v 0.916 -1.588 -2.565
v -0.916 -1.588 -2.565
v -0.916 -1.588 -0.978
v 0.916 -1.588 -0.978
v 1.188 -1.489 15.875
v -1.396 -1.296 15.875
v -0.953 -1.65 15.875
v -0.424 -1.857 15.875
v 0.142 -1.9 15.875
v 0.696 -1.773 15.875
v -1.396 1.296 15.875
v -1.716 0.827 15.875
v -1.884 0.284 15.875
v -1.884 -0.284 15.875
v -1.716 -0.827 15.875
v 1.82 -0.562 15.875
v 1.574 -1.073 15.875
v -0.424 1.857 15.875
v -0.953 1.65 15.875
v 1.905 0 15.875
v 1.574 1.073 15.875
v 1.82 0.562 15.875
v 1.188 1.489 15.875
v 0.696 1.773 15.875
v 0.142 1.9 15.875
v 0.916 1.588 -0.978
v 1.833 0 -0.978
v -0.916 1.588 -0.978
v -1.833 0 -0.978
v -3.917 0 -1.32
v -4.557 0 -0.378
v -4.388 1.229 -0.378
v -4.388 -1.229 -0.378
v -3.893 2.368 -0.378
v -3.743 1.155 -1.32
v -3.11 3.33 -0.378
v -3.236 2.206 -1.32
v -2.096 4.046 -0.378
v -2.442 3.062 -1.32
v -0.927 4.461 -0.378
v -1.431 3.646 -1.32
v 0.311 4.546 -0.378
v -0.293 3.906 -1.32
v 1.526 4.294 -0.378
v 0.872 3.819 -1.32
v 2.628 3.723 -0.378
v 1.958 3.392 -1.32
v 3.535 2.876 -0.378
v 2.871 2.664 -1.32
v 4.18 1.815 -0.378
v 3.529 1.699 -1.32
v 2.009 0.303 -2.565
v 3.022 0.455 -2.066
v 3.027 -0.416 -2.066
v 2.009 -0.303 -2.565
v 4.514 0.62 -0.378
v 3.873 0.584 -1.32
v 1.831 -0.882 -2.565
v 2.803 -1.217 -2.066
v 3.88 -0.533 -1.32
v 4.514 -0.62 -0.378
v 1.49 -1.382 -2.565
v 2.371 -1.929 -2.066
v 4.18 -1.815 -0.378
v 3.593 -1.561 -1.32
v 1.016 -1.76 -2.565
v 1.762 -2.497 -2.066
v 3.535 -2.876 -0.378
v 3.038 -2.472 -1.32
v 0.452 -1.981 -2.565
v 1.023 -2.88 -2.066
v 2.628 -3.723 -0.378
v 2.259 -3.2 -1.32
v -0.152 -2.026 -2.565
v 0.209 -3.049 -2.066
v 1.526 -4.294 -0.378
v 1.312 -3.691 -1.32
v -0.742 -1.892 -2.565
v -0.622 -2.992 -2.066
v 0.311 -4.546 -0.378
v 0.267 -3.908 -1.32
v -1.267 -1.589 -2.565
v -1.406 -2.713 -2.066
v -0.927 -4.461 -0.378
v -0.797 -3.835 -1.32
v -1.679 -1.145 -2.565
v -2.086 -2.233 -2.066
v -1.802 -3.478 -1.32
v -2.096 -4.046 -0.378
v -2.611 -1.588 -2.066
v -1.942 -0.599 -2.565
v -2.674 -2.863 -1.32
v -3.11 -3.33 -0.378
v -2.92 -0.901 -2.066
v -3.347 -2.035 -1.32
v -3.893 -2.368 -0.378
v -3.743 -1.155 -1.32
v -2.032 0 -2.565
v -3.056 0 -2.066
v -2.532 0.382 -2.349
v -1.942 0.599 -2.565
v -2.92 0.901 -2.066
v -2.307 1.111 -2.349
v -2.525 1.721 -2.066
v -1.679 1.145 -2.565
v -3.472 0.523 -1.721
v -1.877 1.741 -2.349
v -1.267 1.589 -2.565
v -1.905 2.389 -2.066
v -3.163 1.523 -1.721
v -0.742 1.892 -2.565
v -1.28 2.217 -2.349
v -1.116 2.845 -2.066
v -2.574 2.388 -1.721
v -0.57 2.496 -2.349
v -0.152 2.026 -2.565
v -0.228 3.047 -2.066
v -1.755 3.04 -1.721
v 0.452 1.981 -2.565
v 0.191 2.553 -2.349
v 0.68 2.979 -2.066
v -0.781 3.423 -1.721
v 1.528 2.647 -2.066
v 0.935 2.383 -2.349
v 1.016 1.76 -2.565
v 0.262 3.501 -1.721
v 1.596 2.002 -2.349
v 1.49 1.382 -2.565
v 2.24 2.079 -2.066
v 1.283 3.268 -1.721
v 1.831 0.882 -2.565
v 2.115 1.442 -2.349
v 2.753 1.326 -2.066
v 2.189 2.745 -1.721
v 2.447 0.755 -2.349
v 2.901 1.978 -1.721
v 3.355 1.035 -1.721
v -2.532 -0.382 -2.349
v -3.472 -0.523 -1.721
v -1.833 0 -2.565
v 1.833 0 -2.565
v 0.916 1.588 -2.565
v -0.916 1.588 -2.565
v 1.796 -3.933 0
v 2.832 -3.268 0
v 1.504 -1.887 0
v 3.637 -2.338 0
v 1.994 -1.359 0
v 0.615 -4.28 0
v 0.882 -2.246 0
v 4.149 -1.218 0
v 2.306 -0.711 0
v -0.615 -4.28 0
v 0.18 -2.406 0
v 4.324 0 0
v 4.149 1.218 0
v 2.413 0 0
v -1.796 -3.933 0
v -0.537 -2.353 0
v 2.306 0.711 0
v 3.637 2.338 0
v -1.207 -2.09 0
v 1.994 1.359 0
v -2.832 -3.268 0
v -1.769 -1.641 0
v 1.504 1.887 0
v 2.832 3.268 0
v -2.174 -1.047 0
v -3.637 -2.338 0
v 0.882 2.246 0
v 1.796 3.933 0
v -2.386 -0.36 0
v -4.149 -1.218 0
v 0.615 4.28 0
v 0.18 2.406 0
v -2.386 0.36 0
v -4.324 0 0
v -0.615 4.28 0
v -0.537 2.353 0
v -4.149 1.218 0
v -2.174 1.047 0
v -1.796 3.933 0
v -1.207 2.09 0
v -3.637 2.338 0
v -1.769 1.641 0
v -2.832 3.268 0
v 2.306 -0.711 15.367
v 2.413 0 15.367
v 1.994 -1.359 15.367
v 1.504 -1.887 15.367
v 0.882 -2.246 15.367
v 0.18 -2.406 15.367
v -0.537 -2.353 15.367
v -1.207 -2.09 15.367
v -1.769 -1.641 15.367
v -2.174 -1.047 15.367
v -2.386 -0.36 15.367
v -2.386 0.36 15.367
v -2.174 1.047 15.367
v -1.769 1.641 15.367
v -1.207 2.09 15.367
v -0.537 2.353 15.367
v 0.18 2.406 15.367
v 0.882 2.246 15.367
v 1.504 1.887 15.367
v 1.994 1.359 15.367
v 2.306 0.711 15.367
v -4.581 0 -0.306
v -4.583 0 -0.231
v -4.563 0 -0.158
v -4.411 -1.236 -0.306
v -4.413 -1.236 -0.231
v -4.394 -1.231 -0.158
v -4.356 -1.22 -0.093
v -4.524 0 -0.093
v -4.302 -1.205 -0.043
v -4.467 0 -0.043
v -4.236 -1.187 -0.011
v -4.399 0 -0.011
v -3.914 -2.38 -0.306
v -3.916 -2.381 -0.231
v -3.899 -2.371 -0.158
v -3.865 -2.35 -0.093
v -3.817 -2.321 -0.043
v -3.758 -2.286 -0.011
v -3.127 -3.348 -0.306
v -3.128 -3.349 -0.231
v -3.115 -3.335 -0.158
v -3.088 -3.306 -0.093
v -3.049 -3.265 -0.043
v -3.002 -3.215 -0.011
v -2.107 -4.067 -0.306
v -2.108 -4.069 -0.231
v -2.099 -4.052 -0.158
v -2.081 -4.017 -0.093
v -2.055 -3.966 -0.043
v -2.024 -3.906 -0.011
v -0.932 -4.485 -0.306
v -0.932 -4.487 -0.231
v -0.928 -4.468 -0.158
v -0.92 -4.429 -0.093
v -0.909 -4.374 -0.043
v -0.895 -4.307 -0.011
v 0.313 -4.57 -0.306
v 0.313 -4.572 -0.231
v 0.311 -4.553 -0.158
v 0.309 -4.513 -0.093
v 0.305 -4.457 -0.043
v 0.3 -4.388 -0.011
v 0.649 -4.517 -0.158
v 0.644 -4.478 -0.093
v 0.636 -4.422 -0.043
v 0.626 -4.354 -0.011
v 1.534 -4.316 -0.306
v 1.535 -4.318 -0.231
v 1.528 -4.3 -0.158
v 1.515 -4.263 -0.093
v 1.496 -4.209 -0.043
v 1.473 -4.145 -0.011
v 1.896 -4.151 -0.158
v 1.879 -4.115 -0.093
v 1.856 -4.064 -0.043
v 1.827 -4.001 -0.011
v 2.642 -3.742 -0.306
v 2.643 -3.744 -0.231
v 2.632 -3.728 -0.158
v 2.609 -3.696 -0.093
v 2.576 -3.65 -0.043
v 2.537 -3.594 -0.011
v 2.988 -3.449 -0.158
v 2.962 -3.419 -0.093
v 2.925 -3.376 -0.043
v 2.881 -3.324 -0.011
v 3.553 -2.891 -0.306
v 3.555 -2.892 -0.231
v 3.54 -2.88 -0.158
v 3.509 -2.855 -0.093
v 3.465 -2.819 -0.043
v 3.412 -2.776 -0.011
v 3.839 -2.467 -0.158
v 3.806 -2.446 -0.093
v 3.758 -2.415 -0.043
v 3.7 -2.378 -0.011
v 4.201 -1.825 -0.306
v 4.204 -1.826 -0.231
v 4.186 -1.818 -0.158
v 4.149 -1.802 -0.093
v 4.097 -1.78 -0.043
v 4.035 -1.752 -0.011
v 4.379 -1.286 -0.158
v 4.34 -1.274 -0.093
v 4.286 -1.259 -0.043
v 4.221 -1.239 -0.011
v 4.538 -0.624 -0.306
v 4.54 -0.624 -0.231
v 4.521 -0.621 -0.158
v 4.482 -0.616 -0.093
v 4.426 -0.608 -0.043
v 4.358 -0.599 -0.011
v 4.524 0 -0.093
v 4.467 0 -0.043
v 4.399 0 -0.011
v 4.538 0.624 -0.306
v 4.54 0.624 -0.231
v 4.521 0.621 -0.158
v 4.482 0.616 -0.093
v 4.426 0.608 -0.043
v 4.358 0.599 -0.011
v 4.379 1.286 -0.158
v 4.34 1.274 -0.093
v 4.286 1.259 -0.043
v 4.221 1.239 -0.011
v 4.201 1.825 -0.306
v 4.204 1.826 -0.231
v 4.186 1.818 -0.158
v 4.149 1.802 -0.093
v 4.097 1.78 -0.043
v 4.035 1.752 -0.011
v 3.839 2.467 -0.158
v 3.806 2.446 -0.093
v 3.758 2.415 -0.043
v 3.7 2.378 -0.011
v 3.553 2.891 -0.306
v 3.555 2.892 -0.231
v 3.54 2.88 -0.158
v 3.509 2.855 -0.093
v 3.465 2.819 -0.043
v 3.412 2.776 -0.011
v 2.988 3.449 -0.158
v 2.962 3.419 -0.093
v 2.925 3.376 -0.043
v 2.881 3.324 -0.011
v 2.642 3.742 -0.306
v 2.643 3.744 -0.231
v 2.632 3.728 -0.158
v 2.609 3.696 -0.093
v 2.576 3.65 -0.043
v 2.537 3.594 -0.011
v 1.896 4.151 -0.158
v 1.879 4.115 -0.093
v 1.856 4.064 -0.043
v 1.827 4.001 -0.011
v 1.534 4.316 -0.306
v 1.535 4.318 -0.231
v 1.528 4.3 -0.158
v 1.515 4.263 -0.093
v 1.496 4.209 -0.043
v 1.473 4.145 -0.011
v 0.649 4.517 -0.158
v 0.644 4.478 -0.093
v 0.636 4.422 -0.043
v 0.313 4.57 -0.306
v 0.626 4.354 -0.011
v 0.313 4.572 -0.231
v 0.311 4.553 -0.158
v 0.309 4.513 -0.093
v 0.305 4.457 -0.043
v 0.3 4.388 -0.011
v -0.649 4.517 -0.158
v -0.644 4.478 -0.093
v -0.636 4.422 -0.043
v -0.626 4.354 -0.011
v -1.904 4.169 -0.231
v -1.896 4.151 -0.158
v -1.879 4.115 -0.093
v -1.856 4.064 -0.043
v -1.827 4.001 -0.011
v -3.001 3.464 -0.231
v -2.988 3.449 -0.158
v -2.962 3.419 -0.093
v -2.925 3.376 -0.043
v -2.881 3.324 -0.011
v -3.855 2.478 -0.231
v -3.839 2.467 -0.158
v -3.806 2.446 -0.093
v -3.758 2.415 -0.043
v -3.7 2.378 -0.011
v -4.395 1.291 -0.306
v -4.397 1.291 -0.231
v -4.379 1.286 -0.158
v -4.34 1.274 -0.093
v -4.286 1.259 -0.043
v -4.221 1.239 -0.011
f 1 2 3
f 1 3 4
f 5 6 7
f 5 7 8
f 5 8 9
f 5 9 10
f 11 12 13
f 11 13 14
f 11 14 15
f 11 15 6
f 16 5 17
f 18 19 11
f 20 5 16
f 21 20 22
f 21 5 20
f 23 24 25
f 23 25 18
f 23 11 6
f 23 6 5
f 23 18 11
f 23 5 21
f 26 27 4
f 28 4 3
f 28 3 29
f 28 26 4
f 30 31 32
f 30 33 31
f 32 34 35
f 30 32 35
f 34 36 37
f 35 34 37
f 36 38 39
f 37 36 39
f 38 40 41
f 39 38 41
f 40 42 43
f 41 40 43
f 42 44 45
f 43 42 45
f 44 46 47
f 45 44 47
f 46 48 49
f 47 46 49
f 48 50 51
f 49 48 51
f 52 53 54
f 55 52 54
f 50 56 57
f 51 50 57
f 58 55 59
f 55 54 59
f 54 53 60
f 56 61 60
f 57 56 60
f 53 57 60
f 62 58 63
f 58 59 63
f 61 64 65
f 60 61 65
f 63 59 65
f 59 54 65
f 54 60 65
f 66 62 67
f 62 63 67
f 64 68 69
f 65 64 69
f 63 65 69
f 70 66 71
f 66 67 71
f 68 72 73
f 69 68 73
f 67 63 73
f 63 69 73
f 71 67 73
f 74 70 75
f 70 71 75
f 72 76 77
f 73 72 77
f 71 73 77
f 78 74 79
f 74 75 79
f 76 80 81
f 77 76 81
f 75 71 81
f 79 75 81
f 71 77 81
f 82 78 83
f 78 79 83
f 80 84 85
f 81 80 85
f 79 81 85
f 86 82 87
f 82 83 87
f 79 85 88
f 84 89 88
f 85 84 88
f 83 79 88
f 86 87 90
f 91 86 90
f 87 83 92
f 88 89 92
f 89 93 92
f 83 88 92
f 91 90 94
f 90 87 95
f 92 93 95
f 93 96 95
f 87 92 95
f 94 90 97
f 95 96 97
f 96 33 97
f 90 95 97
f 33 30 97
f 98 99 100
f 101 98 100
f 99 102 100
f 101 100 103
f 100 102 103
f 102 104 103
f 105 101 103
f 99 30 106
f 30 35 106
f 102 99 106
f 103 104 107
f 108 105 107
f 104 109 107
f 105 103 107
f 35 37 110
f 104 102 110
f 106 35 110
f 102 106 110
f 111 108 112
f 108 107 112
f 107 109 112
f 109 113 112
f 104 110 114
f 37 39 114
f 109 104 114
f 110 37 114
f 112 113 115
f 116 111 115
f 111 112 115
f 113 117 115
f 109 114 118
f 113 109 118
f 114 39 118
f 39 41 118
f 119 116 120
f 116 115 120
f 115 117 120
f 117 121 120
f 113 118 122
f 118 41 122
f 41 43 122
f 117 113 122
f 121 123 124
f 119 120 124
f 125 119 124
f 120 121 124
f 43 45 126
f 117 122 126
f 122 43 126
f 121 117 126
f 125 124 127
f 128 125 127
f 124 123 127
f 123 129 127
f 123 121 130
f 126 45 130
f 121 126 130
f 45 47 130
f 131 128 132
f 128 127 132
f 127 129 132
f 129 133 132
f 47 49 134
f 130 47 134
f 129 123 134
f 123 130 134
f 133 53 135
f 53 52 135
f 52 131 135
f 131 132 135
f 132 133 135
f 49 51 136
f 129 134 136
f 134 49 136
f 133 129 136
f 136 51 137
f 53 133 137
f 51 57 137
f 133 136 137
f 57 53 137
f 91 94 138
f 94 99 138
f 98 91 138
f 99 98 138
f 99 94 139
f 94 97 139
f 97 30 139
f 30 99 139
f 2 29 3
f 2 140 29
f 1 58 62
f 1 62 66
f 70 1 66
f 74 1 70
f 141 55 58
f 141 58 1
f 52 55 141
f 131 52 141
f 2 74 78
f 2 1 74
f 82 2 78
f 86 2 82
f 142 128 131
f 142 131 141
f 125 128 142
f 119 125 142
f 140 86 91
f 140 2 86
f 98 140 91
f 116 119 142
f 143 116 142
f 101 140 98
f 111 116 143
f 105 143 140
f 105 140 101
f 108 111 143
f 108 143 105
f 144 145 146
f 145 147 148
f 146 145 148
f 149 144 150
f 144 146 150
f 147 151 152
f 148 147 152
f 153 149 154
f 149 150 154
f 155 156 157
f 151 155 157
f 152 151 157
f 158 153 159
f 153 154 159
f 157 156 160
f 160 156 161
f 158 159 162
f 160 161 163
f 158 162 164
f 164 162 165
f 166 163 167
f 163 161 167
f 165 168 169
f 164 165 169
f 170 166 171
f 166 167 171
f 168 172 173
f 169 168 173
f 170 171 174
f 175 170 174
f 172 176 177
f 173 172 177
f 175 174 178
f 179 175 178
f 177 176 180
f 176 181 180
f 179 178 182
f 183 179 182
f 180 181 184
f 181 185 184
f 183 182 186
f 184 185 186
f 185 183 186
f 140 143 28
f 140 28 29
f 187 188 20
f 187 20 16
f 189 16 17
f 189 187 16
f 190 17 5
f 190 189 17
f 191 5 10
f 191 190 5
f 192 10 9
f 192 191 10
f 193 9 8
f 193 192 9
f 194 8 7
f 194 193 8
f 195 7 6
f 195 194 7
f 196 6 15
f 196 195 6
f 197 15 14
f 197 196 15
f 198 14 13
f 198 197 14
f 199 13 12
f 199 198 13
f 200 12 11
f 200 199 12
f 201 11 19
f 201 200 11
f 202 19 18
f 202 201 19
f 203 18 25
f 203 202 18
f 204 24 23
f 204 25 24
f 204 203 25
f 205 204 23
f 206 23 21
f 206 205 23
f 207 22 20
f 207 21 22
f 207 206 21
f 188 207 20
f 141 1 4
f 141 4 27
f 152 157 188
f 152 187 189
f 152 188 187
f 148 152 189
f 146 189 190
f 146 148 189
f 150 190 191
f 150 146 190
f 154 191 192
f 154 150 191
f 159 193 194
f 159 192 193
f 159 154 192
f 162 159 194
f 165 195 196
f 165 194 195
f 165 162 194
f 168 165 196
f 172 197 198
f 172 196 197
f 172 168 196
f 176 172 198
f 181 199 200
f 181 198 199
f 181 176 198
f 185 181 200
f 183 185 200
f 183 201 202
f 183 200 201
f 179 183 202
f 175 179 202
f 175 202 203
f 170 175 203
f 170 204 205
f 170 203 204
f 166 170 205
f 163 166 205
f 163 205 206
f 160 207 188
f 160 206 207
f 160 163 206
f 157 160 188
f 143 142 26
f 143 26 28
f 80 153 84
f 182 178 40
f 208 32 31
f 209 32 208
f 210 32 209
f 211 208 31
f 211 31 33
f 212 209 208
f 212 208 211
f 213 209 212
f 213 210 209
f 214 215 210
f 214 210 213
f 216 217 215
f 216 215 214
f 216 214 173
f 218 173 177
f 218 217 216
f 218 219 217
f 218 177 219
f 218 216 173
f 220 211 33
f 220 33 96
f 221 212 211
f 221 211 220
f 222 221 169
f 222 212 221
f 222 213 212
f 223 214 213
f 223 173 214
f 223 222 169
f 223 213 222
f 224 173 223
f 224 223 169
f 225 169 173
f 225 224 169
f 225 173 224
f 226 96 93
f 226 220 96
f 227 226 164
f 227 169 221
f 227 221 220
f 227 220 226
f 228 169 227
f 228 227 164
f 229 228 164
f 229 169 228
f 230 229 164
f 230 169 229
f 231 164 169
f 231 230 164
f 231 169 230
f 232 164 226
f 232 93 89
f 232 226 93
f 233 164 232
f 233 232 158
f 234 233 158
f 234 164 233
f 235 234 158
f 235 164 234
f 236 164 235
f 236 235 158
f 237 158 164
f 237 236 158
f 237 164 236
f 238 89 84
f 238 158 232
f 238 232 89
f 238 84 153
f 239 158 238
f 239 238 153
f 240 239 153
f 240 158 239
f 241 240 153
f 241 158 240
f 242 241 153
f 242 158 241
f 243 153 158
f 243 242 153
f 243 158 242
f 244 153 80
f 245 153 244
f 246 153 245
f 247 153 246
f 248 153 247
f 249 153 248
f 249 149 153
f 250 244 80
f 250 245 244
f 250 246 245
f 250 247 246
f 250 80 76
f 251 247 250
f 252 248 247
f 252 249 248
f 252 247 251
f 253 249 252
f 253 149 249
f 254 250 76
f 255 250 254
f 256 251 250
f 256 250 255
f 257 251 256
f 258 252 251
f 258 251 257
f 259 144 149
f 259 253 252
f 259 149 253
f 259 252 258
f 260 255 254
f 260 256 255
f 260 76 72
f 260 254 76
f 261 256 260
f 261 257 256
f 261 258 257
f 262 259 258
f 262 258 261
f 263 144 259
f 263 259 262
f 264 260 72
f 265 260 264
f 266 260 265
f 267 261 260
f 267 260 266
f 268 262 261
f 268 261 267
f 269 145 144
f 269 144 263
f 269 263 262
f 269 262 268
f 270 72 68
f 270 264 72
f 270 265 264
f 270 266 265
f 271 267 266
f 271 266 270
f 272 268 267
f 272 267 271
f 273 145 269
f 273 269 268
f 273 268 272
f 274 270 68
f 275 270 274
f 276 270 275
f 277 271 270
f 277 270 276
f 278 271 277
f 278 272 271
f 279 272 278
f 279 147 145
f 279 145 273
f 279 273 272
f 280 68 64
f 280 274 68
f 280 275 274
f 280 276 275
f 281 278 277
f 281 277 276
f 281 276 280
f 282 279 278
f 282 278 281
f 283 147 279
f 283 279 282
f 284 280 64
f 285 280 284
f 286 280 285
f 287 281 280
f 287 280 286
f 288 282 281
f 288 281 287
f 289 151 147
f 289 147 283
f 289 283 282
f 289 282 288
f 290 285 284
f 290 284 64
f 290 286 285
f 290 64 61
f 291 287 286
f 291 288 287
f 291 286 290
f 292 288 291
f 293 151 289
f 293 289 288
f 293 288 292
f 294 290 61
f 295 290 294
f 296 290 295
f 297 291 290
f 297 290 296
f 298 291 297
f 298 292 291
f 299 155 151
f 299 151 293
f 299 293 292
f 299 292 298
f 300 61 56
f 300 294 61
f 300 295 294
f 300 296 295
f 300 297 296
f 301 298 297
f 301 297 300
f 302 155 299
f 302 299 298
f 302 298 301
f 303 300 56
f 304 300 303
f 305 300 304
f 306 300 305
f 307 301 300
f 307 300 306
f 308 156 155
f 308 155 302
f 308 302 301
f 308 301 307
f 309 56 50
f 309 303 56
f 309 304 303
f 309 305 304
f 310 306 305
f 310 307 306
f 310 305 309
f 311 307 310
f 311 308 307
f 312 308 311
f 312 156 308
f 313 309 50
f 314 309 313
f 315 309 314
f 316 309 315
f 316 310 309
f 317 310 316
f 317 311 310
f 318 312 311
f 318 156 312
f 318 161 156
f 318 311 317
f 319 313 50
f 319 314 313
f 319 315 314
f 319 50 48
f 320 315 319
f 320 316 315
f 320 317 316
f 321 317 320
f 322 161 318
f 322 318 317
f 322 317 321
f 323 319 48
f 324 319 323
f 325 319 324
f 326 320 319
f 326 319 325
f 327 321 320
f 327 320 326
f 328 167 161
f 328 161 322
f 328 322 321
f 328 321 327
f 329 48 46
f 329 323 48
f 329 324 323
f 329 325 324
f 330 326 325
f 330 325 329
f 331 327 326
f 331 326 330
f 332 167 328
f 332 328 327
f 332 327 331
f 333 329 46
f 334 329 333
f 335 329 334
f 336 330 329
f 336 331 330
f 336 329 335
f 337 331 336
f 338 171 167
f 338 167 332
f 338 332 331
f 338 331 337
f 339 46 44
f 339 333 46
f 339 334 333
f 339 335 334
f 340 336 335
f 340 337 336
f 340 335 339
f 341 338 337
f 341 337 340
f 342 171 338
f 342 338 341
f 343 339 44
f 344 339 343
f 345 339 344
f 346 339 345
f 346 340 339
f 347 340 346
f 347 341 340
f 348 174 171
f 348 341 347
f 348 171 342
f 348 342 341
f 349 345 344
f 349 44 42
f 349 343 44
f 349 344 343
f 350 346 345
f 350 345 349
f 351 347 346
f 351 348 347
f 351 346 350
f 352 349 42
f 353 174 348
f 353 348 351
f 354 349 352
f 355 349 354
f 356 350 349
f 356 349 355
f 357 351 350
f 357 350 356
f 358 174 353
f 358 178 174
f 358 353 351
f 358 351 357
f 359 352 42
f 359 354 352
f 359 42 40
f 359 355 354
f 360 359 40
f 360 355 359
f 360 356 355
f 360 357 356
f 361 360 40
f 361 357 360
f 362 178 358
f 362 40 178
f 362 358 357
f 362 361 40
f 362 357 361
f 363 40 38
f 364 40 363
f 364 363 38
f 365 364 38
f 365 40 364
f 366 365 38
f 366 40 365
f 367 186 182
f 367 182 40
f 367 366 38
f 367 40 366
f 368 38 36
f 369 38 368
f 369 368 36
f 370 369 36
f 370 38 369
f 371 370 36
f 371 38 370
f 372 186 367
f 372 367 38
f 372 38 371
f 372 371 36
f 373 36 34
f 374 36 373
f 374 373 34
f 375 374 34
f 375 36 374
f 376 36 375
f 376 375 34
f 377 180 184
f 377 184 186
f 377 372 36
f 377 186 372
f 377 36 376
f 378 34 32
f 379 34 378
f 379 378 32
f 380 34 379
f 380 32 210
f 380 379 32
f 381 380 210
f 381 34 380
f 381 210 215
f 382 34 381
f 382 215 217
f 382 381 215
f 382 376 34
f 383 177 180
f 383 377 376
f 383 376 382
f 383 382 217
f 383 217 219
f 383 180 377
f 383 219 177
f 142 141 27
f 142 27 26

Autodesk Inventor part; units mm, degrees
ref_plane "YZ Plane" through (0, 0, 0) normal (1, 0, 0) x (0, 1, 0)
ref_plane "XZ Plane" through (0, 0, 0) normal (0, 1, 0) x (-1, 0, 0)
ref_plane "XY Plane" through (0, 0, 0) normal (0, 0, 1) x (1, 0, 0)
sketch "Sketch1" plane through (0, 0, 0) normal (0, 0, 1) x (1, 0, 0)
  circle A0 centre (0, 0) radius 2.413
  dimension "d0" = 4.826
extrude "Extrusion1" add sketch "Sketch1" along normal blind 15.875
sketch "Sketch2" plane through (0, 0, 0) normal (0, 1, 0) x (-1, 0, 0)
  line L0 (0, 0) -> (0, -2.5654)
  line L1 (0, 0) -> (4.3239, 0)
  line L2 (0, -2.5654) -> (2.032, -2.5654)
  line L3 (4.3239, 0) -> (4.3239, 3.8864) construction
  arc A0 (4.5568, -0.3781) -> (4.3239, 0) centre (4.3239, -0.2608) ccw
  arc A1 (2.032, -2.5654) -> (4.5568, -0.3781) centre (0.6382, 1.5944) ccw
  line L4 (4.5847, 0.6553) -> (4.5847, -0.2608) construction
  dimension "d3" = 2.5654
  dimension "d6" = 2.032
  dimension "d12" = 4.5847
revolve "Revolution1" add sketch "Sketch2" angle 360 about axis through (0, 0, 0) along (0, 0, -1)
sketch "Sketch3" plane through (0, 0, -2.5654) normal (0, 0, -1) x (-1, 0, 0)
  circle A0 centre (0, 0) radius 2.032 projected
  line L0 (-0.9165, 1.5875) -> (0.9165, 1.5875)
  line L1 (0.9165, 1.5875) -> (1.8331, 0)
  line L2 (1.8331, 0) -> (0.9165, -1.5875)
  line L3 (0.9165, -1.5875) -> (-0.9165, -1.5875)
  line L4 (-0.9165, -1.5875) -> (-1.8331, 0)
  line L5 (-1.8331, 0) -> (-0.9165, 1.5875)
  dimension "d8" = 3.175
extrude "Extrusion2" cut sketch "Sketch3" against normal blind 1.5875 contours L0 L1 L2 L3 L4 L5
chamfer "Chamfer1" distance 0.508 angle 45 1 edges at (-2.413, 0, 15.875)
thread "Thread1" size "10-32 UNF" class "2A" standard "ANSI Unified Screw Threads" full length
properties part number "10-32 x625 button head" material "Steel"
